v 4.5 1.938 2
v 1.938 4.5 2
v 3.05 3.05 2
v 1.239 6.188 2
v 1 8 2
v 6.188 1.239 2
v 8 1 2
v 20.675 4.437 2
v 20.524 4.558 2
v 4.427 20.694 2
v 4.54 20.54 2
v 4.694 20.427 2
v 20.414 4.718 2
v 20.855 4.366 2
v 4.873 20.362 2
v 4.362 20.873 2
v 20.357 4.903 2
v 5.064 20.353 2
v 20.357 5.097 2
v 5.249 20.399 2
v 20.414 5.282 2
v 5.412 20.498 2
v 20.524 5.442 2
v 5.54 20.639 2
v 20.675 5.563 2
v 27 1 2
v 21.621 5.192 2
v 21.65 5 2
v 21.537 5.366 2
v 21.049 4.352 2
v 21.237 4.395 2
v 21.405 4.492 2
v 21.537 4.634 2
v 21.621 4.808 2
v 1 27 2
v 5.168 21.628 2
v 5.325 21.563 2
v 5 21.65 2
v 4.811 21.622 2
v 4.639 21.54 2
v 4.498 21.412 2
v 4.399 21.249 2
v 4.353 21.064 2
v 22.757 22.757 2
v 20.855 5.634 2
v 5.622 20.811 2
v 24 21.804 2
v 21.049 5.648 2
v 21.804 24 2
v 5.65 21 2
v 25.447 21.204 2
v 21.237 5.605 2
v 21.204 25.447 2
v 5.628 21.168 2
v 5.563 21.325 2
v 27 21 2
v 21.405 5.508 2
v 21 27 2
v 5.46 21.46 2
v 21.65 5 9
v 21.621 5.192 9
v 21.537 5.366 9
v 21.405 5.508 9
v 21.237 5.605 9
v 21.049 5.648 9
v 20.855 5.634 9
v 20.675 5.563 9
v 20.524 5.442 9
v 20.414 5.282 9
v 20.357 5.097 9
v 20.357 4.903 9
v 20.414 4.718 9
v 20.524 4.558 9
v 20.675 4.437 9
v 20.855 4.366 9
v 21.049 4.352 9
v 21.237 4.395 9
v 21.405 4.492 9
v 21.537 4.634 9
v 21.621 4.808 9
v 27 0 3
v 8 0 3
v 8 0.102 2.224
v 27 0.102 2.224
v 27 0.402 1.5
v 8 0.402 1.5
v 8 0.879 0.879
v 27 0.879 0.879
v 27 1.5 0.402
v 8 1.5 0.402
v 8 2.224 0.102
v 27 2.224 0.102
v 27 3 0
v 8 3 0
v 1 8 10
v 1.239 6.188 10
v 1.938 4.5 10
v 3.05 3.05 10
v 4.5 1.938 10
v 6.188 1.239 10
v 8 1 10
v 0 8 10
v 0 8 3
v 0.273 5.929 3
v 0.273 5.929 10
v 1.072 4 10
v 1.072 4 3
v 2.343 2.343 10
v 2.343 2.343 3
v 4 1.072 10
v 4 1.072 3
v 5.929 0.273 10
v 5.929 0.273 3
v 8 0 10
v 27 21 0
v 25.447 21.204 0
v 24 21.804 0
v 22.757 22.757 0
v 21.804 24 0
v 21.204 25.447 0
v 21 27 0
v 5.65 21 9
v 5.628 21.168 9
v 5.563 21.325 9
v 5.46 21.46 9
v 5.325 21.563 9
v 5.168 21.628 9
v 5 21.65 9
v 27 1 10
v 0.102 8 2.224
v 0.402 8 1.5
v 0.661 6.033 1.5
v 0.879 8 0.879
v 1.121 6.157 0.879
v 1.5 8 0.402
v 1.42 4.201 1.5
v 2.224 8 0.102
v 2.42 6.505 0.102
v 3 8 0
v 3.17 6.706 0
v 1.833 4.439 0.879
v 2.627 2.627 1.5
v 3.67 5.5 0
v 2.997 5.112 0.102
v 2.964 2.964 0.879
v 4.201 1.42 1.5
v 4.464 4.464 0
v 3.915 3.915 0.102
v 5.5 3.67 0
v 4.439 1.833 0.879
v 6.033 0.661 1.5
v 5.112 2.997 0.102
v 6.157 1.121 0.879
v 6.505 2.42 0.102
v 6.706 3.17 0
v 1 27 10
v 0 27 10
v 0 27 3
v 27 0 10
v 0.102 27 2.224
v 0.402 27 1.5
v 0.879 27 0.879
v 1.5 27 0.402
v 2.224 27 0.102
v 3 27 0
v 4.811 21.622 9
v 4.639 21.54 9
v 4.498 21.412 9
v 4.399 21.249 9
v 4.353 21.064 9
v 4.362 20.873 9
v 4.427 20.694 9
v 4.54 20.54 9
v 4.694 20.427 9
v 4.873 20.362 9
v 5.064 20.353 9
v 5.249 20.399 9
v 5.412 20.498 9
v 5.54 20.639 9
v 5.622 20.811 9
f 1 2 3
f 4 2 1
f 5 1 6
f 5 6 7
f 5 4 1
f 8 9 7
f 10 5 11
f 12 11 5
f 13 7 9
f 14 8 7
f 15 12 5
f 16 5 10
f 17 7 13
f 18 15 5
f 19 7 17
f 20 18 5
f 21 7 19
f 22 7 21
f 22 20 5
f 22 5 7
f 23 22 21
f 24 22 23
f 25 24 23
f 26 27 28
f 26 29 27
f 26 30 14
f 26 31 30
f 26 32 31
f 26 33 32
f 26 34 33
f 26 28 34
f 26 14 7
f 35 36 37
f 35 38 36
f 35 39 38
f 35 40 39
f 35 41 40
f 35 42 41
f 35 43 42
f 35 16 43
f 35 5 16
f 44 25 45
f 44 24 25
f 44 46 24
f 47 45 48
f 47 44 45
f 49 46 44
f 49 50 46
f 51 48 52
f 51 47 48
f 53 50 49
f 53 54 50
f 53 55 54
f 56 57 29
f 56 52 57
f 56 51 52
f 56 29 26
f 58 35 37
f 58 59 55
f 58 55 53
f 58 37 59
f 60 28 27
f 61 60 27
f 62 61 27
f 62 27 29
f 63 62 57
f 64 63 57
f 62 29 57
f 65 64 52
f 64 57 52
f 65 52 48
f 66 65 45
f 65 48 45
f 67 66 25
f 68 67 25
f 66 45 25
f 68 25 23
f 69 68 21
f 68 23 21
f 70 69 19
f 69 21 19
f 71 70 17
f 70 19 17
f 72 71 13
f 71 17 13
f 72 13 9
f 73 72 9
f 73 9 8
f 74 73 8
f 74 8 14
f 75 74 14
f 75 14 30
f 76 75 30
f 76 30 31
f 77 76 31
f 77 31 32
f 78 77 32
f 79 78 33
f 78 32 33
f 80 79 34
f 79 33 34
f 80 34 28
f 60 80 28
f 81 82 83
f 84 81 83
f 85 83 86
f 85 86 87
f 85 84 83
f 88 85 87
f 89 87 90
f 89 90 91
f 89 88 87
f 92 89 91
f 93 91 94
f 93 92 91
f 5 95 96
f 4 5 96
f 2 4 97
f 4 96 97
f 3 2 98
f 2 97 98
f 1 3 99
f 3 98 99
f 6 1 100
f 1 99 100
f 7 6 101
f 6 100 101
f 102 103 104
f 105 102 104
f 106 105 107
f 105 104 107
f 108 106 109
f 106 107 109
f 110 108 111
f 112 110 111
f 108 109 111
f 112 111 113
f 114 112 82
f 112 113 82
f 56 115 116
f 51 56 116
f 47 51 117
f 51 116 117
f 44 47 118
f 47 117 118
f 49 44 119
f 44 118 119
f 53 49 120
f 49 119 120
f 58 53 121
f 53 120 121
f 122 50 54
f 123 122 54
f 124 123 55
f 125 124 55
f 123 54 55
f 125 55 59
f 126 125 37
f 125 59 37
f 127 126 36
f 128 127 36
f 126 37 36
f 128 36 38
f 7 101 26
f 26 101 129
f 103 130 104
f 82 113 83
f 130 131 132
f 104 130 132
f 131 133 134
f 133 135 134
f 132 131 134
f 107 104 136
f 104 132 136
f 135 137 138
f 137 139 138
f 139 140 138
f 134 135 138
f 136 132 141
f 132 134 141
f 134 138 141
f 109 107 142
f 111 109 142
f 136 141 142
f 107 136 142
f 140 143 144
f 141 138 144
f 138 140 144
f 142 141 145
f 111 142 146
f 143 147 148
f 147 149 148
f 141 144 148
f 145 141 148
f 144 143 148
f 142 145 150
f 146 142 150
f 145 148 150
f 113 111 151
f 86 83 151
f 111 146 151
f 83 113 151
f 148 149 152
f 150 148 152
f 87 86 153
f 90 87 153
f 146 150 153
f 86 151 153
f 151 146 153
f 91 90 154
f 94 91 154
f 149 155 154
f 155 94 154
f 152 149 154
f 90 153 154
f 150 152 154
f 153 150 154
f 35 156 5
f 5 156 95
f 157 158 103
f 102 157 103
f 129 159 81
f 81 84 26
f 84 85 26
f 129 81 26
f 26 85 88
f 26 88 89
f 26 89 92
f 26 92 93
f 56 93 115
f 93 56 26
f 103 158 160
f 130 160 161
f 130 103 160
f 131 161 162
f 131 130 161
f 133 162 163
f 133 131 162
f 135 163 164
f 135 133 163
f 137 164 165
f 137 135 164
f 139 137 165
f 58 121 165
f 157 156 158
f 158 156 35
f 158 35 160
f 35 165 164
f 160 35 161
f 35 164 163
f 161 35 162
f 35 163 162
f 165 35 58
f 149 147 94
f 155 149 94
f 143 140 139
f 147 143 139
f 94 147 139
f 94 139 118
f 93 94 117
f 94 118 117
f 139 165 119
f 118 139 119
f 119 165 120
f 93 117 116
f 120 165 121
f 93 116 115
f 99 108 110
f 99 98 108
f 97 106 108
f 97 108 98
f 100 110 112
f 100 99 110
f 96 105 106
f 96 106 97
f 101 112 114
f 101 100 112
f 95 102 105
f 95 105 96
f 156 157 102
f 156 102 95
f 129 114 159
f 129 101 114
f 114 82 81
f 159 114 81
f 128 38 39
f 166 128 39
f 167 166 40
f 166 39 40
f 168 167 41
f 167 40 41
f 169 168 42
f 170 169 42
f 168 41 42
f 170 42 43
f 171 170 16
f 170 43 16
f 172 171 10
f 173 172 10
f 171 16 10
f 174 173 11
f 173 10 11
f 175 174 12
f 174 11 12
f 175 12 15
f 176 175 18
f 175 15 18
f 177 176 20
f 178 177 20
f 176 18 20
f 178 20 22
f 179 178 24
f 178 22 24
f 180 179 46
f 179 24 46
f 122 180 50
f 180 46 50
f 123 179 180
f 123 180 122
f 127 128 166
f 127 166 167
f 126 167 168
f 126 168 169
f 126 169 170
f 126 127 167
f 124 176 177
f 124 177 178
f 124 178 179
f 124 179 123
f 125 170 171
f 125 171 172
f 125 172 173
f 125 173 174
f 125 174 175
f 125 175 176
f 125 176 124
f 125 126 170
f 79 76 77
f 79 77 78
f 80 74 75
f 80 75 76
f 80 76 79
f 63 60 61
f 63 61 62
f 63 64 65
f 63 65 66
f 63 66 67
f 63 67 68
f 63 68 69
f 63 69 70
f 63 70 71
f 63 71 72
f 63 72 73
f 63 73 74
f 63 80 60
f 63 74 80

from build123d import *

# Parameters (mm, degrees)
F1_DEPTH = 10
F2_R     = 3
F4_DEPTH = 8
F5_R     = 0.65
F6_DEPTH = 7


with BuildPart() as f1:
    # F0 (on Top) → F1 (new body)
    with BuildSketch(Plane.XY):
        with BuildLine():
            ThreePointArc((0, 8), (2.343146, 2.343146), (8, 0))
            Line((8, 0), (27, 0))
            Line((27, 0), (27, 21))
            ThreePointArc((27, 21), (22.757359, 22.757359), (21, 27))
            Line((21, 27), (0, 27))
            Line((0, 27), (0, 8))
        make_face()
    extrude(amount=F1_DEPTH)

    # F2
    f2_edges = [f1.edges().sort_by_distance(p)[0] for p in [
        (17.5, 0, 0),
        (2.343146, 2.343146, 0),
        (0, 17.5, 0),
    ]]
    fillet(f2_edges, radius=F2_R)

    # F3 (on face) → F4 (cut)
    with BuildSketch(Plane.XY.offset(10)):
        with BuildLine():
            Line((20.071797, 26), (1, 26))
            Line((1, 26), (1, 8))
            ThreePointArc((1, 8), (3.050253, 3.050253), (8, 1))
            Line((8, 1), (26, 1))
            Line((26, 1), (26, 20.071797))
            ThreePointArc((26, 20.071797), (22.050253, 22.050253), (20.071797, 26))
        make_face()
        with BuildLine():
            Line((1, 27), (1, 26))
            Line((1, 26), (20.071797, 26))
            ThreePointArc((20.071797, 26), (22.050253, 22.050253), (26, 20.071797))
            Line((26, 20.071797), (26, 1))
            Line((26, 1), (27, 1))
            Line((27, 1), (27, 21))
            ThreePointArc((27, 21), (22.757359, 22.757359), (21, 27))
            Line((21, 27), (1, 27))
        make_face()
    extrude(amount=-F4_DEPTH, mode=Mode.SUBTRACT)

    # F5 (on face) → F6 (join)
    with BuildSketch(Plane.XY.offset(2)):
        with Locations((21, 5)):
            Circle(F5_R)
        with BuildLine():
            ThreePointArc((5.65, 21), (5.459619, 21.459619), (5, 21.65))
            ThreePointArc((5, 21.65), (4.540381, 20.540381), (5.65, 21))
        make_face()
    extrude(amount=F6_DEPTH)


solid = f1.part
